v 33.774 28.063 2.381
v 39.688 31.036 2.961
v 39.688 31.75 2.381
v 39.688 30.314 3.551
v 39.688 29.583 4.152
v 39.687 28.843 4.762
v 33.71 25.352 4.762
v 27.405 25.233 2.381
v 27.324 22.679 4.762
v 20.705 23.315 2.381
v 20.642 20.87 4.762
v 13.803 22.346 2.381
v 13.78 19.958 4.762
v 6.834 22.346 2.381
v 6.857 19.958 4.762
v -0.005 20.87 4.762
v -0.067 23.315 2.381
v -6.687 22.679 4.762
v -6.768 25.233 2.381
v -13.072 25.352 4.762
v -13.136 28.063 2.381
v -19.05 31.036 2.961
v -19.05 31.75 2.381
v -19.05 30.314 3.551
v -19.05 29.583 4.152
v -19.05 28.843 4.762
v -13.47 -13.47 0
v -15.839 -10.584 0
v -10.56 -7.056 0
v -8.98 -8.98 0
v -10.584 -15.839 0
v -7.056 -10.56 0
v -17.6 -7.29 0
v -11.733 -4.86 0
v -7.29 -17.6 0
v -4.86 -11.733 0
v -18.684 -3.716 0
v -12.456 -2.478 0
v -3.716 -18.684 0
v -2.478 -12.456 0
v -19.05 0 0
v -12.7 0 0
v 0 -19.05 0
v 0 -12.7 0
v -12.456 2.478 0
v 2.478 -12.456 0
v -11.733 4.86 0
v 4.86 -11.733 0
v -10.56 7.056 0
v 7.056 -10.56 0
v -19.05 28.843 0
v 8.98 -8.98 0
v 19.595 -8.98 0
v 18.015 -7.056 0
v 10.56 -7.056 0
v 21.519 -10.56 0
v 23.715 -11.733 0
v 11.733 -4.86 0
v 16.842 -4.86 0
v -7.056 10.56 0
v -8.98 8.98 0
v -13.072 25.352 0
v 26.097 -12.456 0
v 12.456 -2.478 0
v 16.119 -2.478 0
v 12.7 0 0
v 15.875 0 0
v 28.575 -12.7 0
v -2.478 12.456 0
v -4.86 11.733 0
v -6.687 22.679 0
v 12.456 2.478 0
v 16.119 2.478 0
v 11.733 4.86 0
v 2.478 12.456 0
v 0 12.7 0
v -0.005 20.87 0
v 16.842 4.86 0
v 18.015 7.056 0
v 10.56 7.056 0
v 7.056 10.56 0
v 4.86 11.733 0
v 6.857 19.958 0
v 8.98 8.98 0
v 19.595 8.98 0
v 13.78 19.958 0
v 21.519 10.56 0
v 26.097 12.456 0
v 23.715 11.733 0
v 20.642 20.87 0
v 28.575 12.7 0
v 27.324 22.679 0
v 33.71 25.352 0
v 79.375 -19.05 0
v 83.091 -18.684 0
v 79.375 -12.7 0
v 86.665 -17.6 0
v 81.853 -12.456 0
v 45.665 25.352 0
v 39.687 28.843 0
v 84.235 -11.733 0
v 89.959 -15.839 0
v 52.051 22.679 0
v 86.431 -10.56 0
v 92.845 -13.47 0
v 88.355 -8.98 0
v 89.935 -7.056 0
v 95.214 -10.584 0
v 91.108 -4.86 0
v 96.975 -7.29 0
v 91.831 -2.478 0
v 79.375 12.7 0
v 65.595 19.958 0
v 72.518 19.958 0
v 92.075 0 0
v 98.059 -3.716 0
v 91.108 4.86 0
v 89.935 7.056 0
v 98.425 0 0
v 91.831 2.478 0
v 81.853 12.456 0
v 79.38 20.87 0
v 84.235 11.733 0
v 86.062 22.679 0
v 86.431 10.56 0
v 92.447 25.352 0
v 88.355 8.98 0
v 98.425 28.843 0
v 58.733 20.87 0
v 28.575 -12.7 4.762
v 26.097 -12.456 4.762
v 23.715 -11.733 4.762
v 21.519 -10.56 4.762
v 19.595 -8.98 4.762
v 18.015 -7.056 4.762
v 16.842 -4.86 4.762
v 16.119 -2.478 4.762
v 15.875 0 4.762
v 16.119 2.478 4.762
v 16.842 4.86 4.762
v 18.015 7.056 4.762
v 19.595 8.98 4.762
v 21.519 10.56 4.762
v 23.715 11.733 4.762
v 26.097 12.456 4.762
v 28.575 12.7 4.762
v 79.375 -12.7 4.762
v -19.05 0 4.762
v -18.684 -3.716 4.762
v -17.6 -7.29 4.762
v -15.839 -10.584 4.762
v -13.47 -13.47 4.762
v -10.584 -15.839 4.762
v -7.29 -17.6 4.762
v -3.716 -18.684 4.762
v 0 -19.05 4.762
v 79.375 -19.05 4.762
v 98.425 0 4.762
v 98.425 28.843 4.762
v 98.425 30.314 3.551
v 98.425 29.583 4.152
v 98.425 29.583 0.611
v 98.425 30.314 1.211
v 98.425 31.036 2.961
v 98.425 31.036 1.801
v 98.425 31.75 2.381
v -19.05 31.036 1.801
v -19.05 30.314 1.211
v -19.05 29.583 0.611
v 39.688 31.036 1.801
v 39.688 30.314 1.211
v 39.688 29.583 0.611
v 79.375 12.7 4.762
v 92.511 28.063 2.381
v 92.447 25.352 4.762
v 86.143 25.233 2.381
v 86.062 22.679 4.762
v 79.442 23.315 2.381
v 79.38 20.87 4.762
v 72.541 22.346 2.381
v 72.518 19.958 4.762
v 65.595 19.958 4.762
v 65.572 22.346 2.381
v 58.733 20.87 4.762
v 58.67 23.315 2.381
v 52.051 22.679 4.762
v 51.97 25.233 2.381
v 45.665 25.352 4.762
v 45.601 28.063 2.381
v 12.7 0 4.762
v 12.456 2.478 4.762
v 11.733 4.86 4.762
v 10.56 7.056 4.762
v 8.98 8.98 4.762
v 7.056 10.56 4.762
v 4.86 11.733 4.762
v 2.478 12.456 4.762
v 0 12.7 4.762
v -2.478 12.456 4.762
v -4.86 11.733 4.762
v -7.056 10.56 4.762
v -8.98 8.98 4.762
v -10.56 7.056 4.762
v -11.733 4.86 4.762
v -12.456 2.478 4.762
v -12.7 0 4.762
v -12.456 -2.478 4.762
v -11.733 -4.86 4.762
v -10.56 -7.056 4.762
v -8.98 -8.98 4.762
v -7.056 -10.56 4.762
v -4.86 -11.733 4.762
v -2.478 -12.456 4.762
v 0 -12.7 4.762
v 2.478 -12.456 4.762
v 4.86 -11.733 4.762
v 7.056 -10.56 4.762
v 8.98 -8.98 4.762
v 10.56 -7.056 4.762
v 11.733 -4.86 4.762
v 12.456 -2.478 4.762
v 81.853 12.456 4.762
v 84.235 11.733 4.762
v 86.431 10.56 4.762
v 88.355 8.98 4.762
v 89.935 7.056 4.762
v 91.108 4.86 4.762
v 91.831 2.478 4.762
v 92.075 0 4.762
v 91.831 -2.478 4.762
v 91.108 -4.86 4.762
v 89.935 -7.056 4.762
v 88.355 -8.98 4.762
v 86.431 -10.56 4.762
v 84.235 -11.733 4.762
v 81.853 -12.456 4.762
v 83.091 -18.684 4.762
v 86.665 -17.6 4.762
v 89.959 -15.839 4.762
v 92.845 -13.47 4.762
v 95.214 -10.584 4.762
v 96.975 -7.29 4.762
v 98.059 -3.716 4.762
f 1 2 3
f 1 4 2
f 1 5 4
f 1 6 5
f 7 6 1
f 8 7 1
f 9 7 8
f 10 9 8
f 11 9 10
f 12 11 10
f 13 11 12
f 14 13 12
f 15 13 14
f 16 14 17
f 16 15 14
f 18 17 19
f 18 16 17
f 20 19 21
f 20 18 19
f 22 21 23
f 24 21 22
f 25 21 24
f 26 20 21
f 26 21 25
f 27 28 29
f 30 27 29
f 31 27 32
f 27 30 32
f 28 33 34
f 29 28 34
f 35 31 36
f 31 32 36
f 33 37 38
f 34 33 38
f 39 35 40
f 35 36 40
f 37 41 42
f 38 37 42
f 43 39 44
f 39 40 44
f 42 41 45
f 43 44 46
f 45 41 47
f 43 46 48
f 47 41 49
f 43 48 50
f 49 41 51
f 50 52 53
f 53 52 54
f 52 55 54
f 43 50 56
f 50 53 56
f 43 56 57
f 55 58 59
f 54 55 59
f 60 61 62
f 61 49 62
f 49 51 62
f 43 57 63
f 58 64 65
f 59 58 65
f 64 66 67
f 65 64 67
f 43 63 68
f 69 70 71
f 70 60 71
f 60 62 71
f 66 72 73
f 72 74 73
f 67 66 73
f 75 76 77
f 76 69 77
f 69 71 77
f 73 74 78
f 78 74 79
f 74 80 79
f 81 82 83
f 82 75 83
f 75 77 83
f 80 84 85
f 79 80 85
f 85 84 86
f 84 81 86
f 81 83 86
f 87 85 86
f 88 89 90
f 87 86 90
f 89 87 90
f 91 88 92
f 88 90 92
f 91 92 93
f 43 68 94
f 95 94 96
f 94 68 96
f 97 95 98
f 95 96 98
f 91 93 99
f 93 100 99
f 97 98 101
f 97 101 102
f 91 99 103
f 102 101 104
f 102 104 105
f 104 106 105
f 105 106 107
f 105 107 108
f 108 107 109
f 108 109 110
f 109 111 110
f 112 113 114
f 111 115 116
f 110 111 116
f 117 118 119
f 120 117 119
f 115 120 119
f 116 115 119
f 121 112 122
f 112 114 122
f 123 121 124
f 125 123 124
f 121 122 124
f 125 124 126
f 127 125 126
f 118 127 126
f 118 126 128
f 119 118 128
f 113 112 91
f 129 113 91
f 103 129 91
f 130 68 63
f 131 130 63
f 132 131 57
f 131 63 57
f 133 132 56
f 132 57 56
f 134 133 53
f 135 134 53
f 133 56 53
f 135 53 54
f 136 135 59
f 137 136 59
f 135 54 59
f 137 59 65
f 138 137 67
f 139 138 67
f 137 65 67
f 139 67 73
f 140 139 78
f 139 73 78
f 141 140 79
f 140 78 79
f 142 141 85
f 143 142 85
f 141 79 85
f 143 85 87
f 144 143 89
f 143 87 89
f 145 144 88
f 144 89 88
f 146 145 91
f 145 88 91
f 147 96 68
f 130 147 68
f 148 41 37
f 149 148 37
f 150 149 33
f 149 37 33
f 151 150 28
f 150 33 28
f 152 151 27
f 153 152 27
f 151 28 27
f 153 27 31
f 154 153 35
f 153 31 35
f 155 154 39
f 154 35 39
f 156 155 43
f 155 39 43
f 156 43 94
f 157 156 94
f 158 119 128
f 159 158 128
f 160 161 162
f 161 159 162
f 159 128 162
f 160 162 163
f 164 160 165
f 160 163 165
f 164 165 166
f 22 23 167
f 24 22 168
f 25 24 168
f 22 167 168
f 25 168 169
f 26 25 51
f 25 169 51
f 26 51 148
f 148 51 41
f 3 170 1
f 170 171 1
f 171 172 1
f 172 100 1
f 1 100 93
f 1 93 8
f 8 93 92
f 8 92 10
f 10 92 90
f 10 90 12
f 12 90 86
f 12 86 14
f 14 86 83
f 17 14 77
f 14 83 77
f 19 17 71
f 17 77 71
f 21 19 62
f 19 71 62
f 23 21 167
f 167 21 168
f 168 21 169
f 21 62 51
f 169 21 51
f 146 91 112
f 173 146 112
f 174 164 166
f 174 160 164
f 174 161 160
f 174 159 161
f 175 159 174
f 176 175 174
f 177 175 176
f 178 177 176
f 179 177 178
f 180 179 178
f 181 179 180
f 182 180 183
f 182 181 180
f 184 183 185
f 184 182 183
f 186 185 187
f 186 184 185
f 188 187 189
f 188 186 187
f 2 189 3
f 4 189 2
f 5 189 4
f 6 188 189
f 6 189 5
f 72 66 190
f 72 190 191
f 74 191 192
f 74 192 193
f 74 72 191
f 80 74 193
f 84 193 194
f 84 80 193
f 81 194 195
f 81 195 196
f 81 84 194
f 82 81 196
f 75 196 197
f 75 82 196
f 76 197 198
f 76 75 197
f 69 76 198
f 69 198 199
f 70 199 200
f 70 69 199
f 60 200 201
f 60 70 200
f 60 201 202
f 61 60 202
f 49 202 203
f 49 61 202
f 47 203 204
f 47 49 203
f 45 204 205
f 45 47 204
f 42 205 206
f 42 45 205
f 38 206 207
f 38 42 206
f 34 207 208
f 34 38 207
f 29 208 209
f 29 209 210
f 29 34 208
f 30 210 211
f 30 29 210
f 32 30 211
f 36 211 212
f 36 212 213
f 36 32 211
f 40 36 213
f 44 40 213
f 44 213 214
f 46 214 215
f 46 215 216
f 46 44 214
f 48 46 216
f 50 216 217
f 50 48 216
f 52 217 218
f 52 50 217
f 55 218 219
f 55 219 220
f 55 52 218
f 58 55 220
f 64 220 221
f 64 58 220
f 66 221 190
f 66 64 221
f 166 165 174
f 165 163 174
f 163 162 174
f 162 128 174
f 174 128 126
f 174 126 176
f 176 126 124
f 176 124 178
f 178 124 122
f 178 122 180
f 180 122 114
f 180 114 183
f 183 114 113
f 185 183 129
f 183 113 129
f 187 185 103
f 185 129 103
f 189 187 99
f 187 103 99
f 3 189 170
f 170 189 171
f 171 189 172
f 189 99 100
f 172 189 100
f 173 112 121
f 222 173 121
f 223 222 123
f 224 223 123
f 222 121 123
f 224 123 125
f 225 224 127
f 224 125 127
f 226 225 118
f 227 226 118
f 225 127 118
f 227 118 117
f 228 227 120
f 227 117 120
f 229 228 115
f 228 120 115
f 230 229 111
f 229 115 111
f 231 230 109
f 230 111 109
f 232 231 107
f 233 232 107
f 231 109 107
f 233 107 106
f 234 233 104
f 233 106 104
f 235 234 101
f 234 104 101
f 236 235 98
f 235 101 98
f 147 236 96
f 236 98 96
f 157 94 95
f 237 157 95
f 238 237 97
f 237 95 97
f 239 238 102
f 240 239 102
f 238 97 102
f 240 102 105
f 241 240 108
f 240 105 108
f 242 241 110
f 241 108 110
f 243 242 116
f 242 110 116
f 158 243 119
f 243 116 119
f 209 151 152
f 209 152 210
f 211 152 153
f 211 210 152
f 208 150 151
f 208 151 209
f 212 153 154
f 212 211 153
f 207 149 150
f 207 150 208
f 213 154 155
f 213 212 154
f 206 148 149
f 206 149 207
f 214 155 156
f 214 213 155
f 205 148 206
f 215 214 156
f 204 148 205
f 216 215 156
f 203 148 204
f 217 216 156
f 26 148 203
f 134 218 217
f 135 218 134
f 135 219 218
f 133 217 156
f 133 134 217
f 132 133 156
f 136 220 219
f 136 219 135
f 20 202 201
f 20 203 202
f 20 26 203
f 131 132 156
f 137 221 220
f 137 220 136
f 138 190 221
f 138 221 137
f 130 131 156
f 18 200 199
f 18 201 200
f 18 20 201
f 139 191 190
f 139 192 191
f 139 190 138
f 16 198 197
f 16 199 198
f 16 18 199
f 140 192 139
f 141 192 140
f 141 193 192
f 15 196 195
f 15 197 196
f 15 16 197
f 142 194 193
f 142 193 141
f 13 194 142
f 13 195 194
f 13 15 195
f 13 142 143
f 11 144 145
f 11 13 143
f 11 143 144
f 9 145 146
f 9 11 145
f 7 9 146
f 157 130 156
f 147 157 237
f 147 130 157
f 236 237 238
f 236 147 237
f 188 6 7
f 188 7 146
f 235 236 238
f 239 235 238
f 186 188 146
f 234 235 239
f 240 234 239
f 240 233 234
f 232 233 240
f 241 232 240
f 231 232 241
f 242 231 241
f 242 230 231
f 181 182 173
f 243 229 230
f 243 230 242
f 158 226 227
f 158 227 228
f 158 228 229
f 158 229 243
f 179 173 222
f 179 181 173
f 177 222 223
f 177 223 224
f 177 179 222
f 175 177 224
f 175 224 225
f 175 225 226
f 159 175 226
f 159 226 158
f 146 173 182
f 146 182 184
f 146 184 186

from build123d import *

# Parameters (mm, degrees)
F0_R     = 12.7
F1_DEPTH = 4.7625
F2_SIZE  = 2.38124


# Not quite as in the source:
# - a fillet or chamfer is up to 0.001 mm smaller than in the source, because OpenCascade refuses the exact size


with BuildPart() as f1:
    # F0 (on Top) → F1 (new body)
    with BuildSketch(Plane.XY):
        with BuildLine():
            Line((-19.05, 31.75), (-19.05, 0))
            ThreePointArc((-19.05, 0), (-13.4703841816, -13.4703841816), (0, -19.05))
            Line((0, -19.05), (79.375, -19.05))
            ThreePointArc((79.375, -19.05), (92.8453841816, -13.4703841816), (98.425, 0))
            Line((98.425, 0), (98.425, 31.75))
            ThreePointArc((98.425, 31.75), (69.05625, 22.225), (39.6875, 31.75))
            ThreePointArc((39.6875, 31.75), (10.31875, 22.225), (-19.05, 31.75))
        make_face()
        Circle(F0_R, mode=Mode.SUBTRACT)
        with BuildLine():
            Line((79.375, -12.7), (28.575, -12.7))
            ThreePointArc((28.575, -12.7), (15.875, 0), (28.575, 12.7))
            Line((28.575, 12.7), (79.375, 12.7))
            ThreePointArc((79.375, 12.7), (92.075, 0), (79.375, -12.7))
        make_face(mode=Mode.SUBTRACT)
    extrude(amount=F1_DEPTH)

    # F2 (size 2.38125 in the source; OpenCascade refuses exactly that, so slightly less here)
    f2_edges = [f1.edges().sort_by_distance(p)[0] for p in [
        (10.31875, 22.225, 4.7625),
        (69.05625, 22.225, 4.7625),
        (69.05625, 22.225, 0),
        (10.31875, 22.225, 0),
    ]]
    chamfer(f2_edges, length=F2_SIZE)


solid = f1.part
